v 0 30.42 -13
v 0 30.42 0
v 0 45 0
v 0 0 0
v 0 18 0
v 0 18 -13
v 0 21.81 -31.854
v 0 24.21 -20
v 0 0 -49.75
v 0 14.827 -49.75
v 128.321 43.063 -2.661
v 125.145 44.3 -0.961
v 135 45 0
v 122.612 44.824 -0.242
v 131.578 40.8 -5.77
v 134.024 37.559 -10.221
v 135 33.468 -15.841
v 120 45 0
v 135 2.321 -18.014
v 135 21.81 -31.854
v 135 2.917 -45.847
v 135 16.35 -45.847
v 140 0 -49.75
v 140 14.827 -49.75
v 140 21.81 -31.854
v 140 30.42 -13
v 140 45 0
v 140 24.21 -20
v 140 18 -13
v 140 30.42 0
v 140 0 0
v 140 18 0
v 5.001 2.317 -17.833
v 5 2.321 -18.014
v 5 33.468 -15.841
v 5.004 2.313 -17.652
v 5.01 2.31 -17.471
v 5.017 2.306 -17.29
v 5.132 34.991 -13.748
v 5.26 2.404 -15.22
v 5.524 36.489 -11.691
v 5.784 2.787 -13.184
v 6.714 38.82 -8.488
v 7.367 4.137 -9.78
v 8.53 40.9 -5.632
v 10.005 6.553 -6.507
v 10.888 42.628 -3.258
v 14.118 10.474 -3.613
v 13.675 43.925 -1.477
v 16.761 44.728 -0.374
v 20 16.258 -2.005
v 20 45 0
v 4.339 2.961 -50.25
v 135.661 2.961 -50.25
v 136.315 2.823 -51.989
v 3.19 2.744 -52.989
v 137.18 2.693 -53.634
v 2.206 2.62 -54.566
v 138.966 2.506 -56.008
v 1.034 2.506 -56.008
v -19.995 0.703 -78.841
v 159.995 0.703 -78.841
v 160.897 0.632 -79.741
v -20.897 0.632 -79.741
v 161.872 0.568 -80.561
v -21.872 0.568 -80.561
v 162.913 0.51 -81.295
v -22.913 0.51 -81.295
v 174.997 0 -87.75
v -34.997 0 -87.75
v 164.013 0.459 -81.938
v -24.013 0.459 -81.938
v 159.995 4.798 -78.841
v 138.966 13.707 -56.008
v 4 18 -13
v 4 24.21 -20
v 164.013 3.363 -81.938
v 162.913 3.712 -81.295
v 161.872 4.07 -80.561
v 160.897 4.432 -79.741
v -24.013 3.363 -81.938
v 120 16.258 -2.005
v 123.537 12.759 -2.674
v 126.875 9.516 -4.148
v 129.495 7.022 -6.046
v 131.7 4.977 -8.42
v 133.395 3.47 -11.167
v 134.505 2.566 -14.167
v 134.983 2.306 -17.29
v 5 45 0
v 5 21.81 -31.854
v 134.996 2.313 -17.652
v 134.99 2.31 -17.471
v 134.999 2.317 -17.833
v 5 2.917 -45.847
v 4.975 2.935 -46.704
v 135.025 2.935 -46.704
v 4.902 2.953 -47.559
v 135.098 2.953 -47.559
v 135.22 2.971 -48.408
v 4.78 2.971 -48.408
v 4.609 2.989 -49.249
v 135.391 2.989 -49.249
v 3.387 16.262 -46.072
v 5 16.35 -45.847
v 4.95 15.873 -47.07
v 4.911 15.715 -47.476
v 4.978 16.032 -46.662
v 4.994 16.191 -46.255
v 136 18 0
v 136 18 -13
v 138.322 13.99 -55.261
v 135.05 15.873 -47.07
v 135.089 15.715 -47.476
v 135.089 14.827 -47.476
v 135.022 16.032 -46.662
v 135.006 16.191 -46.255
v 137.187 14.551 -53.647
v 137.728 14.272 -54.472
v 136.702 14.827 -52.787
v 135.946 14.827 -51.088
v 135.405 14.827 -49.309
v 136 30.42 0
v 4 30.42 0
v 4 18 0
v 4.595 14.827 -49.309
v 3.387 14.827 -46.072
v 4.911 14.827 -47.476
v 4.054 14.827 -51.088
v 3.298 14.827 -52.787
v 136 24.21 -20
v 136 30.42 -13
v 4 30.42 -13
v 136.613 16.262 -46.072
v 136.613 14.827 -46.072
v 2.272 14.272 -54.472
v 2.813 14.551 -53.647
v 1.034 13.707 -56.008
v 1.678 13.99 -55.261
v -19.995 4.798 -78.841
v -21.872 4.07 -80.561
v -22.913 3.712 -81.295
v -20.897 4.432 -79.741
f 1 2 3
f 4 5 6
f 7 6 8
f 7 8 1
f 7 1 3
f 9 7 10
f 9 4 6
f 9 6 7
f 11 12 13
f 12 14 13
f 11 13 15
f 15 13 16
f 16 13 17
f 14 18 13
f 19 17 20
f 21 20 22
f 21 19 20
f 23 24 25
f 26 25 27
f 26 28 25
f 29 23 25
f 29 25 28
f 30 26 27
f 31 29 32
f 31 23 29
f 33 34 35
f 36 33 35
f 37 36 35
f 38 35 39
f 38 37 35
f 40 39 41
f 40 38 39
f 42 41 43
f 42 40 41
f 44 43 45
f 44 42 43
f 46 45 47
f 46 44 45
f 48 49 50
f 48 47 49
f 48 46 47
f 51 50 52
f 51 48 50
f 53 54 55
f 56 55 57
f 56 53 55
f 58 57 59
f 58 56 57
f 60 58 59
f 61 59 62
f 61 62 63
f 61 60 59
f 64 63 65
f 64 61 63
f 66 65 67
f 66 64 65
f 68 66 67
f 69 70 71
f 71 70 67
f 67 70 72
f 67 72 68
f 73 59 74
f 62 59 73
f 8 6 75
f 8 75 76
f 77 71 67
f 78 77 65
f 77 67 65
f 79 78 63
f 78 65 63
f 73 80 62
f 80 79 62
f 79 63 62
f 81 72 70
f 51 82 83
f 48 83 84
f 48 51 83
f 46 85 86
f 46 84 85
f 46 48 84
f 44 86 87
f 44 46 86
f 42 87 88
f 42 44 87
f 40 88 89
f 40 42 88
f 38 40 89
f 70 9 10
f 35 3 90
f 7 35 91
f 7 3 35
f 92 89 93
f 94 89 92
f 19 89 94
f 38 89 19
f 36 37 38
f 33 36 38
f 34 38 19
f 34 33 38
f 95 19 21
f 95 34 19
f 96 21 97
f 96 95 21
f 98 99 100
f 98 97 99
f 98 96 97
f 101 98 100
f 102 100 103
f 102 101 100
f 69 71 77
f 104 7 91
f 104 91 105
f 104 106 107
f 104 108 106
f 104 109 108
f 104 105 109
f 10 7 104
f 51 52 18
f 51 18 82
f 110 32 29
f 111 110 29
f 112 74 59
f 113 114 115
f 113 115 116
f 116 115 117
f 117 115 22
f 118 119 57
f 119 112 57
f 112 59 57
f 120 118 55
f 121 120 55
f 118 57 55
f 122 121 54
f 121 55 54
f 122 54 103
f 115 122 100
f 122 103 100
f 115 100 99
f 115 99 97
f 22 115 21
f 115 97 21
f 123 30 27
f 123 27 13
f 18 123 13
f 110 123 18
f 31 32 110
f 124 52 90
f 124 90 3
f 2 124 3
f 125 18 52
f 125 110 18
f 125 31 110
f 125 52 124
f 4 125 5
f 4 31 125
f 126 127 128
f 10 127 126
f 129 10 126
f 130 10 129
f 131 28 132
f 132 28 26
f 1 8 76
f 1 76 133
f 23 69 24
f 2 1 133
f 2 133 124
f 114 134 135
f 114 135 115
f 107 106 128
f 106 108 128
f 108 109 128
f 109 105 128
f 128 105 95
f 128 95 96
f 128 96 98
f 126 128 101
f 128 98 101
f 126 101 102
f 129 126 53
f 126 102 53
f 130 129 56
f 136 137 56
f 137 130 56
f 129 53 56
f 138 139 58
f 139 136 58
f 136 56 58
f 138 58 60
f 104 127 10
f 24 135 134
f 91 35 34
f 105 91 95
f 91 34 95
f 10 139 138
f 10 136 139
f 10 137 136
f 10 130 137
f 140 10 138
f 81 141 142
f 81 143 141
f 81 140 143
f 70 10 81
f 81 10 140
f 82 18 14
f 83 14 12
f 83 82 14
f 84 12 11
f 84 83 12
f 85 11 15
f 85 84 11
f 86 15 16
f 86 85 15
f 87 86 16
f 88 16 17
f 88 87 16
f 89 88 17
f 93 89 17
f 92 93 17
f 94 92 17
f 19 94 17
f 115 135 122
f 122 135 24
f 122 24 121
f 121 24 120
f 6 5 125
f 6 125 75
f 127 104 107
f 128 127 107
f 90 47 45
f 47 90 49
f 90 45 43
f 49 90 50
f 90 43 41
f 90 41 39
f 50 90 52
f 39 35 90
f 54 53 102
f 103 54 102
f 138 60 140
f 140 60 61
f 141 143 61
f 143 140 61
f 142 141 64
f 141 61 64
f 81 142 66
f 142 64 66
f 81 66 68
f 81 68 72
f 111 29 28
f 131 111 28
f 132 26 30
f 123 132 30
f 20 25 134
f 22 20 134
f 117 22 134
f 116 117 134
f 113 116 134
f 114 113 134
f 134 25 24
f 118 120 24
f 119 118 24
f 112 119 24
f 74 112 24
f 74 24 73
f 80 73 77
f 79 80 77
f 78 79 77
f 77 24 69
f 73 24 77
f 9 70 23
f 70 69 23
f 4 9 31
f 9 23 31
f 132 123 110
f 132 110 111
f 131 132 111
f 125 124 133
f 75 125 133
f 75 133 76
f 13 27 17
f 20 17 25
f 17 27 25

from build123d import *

# Parameters (mm, degrees)
BOSS_EXTRUDE3_DEPTH     = 45
CUT_EXTRUDE1_DEPTH      = 201.870207973
CUT_EXTRUDE1_DEPTH_BACK = 201.870207973
BOSS_EXTRUDE10_DEPTH    = 45
CUT_EXTRUDE2_DEPTH      = 201.870207973
CUT_EXTRUDE3_DEPTH      = 189.545324927
SKETCH14_W              = 5
SKETCH14_H              = 30.172848437
CUT_EXTRUDE4_DEPTH      = 5
FILLET2_R               = 15
FILLET4_R               = 10
CUT_EXTRUDE5_DEPTH      = 4


with BuildPart() as part:
    # Sketch4 → Boss-Extrude3 (new body)
    with BuildSketch(Plane(origin=(0, 0, 0), x_dir=(1, 0, 0), z_dir=(0, 1, 0))):
        Polygon((0, 49.75), (-34.996508397, 87.75), (174.996508397, 87.75), (140, 49.75), (140, 0), (0, 0), align=None)
    extrude(amount=BOSS_EXTRUDE3_DEPTH)

    # Sketch5 → Cut-Extrude1 (cut, two sides: drawn at the far end of the back side and taken through both)
    with BuildSketch(Plane(origin=(140, 0, 0), x_dir=(0, 0, -1), z_dir=(1, 0, 0)).offset(-CUT_EXTRUDE1_DEPTH_BACK)):
        Polygon((0, 45), (3, 2), (49.75, 3), (87.75, 0), (87.75, 45), align=None)
    extrude(amount=CUT_EXTRUDE1_DEPTH + CUT_EXTRUDE1_DEPTH_BACK, mode=Mode.SUBTRACT)

    # Sketch12 → Boss-Extrude10 (add)
    with BuildSketch(Plane.XZ):
        Polygon((140, 0), (135, 0), (135, -51.701623266), (161.738177617, -80.734541004), (174.996508397, -87.75), (140, -49.75), align=None)
    boss_extrude10 = extrude(amount=-BOSS_EXTRUDE10_DEPTH)

    # Sketch6 → Cut-Extrude2 (cut, symmetric)
    with BuildSketch(Plane(origin=(140, 0, 0), x_dir=(0, 0, -1), z_dir=(1, 0, 0))):
        Polygon((49.75, 45), (0, 45), (31.854288426, 21.809847033), (49.75, 14.827151563), align=None)
    cut_extrude2 = extrude(amount=CUT_EXTRUDE2_DEPTH, both=True, mode=Mode.SUBTRACT)

    # Sketch13 → Cut-Extrude3 (cut, symmetric)
    with BuildSketch(Plane(origin=(50.959743513, 0, 46.931923468), x_dir=(0.6774391869389724, 0, -0.7355787843592718), z_dir=(0.7355787843592718, 0, 0.6774391869389724))):
        Polygon((131.436530693, 14.827151563), (183.096530693, 0), (183.096530693, 45), (131.436530693, 45), align=None)
    cut_extrude3 = extrude(amount=CUT_EXTRUDE3_DEPTH, both=True, mode=Mode.SUBTRACT)

    # Sketch14 → Cut-Extrude4 (cut)
    with BuildSketch(Plane(origin=(89.040256487, 0, -96.681923468), x_dir=(-0.7355787843592717, 0, -0.6774391869389725), z_dir=(0.6774391869389725, 0, -0.7355787843592717))):
        with Locations((-66.77843026, 29.913575782)):
            Rectangle(SKETCH14_W, SKETCH14_H)
    cut_extrude4 = extrude(amount=-CUT_EXTRUDE4_DEPTH, mode=Mode.SUBTRACT)

    # Mirror1: Boss-Extrude10, Cut-Extrude2, Cut-Extrude3, Cut-Extrude4 across plane
    add(boss_extrude10.mirror(Plane(origin=(70, 0, 0), x_dir=(0, 0, 1), z_dir=(1, 0, 0))))
    add(cut_extrude2.mirror(Plane(origin=(70, 0, 0), x_dir=(0, 0, 1), z_dir=(1, 0, 0))), mode=Mode.SUBTRACT)
    add(cut_extrude3.mirror(Plane(origin=(70, 0, 0), x_dir=(0, 0, 1), z_dir=(1, 0, 0))), mode=Mode.SUBTRACT)
    add(cut_extrude4.mirror(Plane(origin=(70, 0, 0), x_dir=(0, 0, 1), z_dir=(1, 0, 0))), mode=Mode.SUBTRACT)

    # Fillet2
    # the kernel refuses this fillet: 15 mm, written as the material it adds along each edge
    with BuildSketch(Plane(origin=(5, -35.409066281, -5.609934857), x_dir=(1, 0, 0), z_dir=(0, 0.9975751008362208, 0.06959826284903867))) as fillet2_piece_1_section:
        with BuildLine():
            CenterArc((FILLET2_R, FILLET2_R), FILLET2_R, 180, 90)
            Line((0, FILLET2_R), (0, 0))
            Line((0, 0), (FILLET2_R, 0))
        make_face()
    fillet2_piece_1 = extrude(amount=118.104524125, mode=Mode.PRIVATE)
    fillet2_piece_1 = split(fillet2_piece_1, bisect_by=Plane(origin=(8.441655444, 34.86103845, -13.92700626), z_dir=(0, -0.808453521145491, 0.5885600259510132)), keep=Keep.TOP, mode=Mode.PRIVATE)
    fillet2_piece_1 = split(fillet2_piece_1, bisect_by=Plane(origin=(8.441655444, 0, -4.786685936), z_dir=(0, 1, 0)), keep=Keep.TOP, mode=Mode.PRIVATE)
    add(fillet2_piece_1)
    with BuildSketch(Plane(origin=(135, -35.409066281, -5.609934857), x_dir=(-1, 0, 0), z_dir=(0, 0.9975751008362208, 0.06959826284903867))) as fillet2_piece_2_section:
        with BuildLine():
            CenterArc((FILLET2_R, -FILLET2_R), FILLET2_R, 90, 90)
            Line((0, -FILLET2_R), (0, 0))
            Line((0, 0), (FILLET2_R, 0))
        make_face()
    fillet2_piece_2 = extrude(amount=118.104524125, mode=Mode.PRIVATE)
    fillet2_piece_2 = split(fillet2_piece_2, bisect_by=Plane(origin=(131.558344556, 34.86103845, -13.92700626), z_dir=(0, -0.808453521145491, 0.5885600259510132)), keep=Keep.TOP, mode=Mode.PRIVATE)
    fillet2_piece_2 = split(fillet2_piece_2, bisect_by=Plane(origin=(131.558344556, 0, -4.786685936), z_dir=(0, 1, 0)), keep=Keep.TOP, mode=Mode.PRIVATE)
    add(fillet2_piece_2)
    with BuildSketch(Plane(origin=(5, 2, -3), x_dir=(0, 0.9975751008362208, 0.06959826284903871), z_dir=(1, 0, 0))) as fillet2_piece_3_section:
        with BuildLine():
            CenterArc((FILLET2_R * 0.952861026227, -FILLET2_R), FILLET2_R, 90, 87.234478204)
            Line((-FILLET2_R * 0.0459743260206, -FILLET2_R * 0.951751278775), (0, 0))
            Line((0, 0), (FILLET2_R * 0.952861026227, 0))
        make_face()
    fillet2_piece_3 = extrude(amount=165.732288484, mode=Mode.PRIVATE)
    fillet2_piece_3 = split(fillet2_piece_3, bisect_by=Plane(origin=(140, 5.230522006, -5.949029167), z_dir=(-1, 0, 0)), keep=Keep.TOP, mode=Mode.PRIVATE)
    add(fillet2_piece_3)
    # the kernel refuses this fillet: 15 mm, written as the material it takes off along each edge
    with BuildSketch(Plane(origin=(-21.738177617, -5.880130796, -80.734541004), x_dir=(-0.8838887186878241, 0, -0.4676972663768696), z_dir=(0, 1, 0))) as fillet2_2_piece_1_section:
        with BuildLine():
            CenterArc((FILLET2_R * 0.171572875254, FILLET2_R), FILLET2_R, 250.528779366, 19.471220634)
            Line((-FILLET2_R * 0.16176045808, FILLET2_R * 0.0571909584179), (0, 0))
            Line((0, 0), (FILLET2_R * 0.171572875254, 0))
        make_face()
    fillet2_2_piece_1 = extrude(amount=16.37310681, mode=Mode.PRIVATE)
    fillet2_2_piece_1 = split(fillet2_2_piece_1, bisect_by=Plane(origin=(-21.810642067, 0.577757784, -80.431734736), z_dir=(0, 0.9968981486534686, -0.07870248542001068)), keep=Keep.TOP, mode=Mode.PRIVATE)
    add(fillet2_2_piece_1, mode=Mode.SUBTRACT)
    with BuildSketch(Plane(origin=(5, -11.791250012, -51.701623266), x_dir=(-0.6774391869389725, 0, -0.7355787843592716), z_dir=(0, 1, 0))) as fillet2_2_piece_2_section:
        with BuildLine():
            CenterArc((FILLET2_R * 0.390324653104, FILLET2_R), FILLET2_R, 227.356145275, 42.643854725)
            Line((-FILLET2_R * 0.287114533835, FILLET2_R * 0.264421215641), (0, 0))
            Line((0, 0), (FILLET2_R * 0.390324653104, 0))
        make_face()
    fillet2_2_piece_2 = extrude(amount=41.255576067, mode=Mode.PRIVATE)
    fillet2_2_piece_2 = split(fillet2_2_piece_2, bisect_by=Plane(origin=(4.876560205, 2.973184578, -48.496379006), z_dir=(0, 0.9997713044194101, 0.021385482447473975)), keep=Keep.TOP, mode=Mode.PRIVATE)
    add(fillet2_2_piece_2, mode=Mode.SUBTRACT)
    with BuildSketch(Plane(origin=(5, -11.791250012, -51.701623266), x_dir=(-0.6774391869389725, 0, -0.7355787843592716), z_dir=(0, 1, 0))) as fillet2_2_piece_3_section:
        with BuildLine():
            CenterArc((FILLET2_R * 0.390324653104, FILLET2_R), FILLET2_R, 227.356145275, 42.643854725)
            Line((-FILLET2_R * 0.287114533835, FILLET2_R * 0.264421215641), (0, 0))
            Line((0, 0), (FILLET2_R * 0.390324653104, 0))
        make_face()
    fillet2_2_piece_3 = extrude(amount=41.255576067, mode=Mode.PRIVATE)
    fillet2_2_piece_3 = split(fillet2_2_piece_3, bisect_by=Plane(origin=(3.697267627, 2.777037551, -52.574191023), z_dir=(0, 0.9968981486534686, -0.07870248542001068)), keep=Keep.TOP, mode=Mode.PRIVATE)
    add(fillet2_2_piece_3, mode=Mode.SUBTRACT)
    with BuildSketch(Plane(origin=(161.738177617, -5.880130796, -80.734541004), x_dir=(-0.6774391869389714, 0, 0.7355787843592727), z_dir=(0, 1, 0))) as fillet2_2_piece_4_section:
        with BuildLine():
            CenterArc((FILLET2_R * 0.171572875254, FILLET2_R), FILLET2_R, 250.528779366, 19.471220634)
            Line((-FILLET2_R * 0.16176045808, FILLET2_R * 0.0571909584179), (0, 0))
            Line((0, 0), (FILLET2_R * 0.171572875254, 0))
        make_face()
    fillet2_2_piece_4 = extrude(amount=16.37310681, mode=Mode.PRIVATE)
    fillet2_2_piece_4 = split(fillet2_2_piece_4, bisect_by=Plane(origin=(161.810642067, 0.577757784, -80.431734736), z_dir=(0, 0.9968981486534686, -0.07870248542001068)), keep=Keep.TOP, mode=Mode.PRIVATE)
    add(fillet2_2_piece_4, mode=Mode.SUBTRACT)
    with BuildSketch(Plane(origin=(135, -11.791250012, -51.701623266), x_dir=(0.6774391869389733, 0, -0.7355787843592709), z_dir=(0, 1, 0))) as fillet2_2_piece_5_section:
        with BuildLine():
            CenterArc((FILLET2_R * 0.390324653104, -FILLET2_R), FILLET2_R, 90, 42.643854725)
            Line((-FILLET2_R * 0.287114533835, -FILLET2_R * 0.264421215641), (0, 0))
            Line((0, 0), (FILLET2_R * 0.390324653104, 0))
        make_face()
    fillet2_2_piece_5 = extrude(amount=41.255576067, mode=Mode.PRIVATE)
    fillet2_2_piece_5 = split(fillet2_2_piece_5, bisect_by=Plane(origin=(135.123439795, 2.973184578, -48.496379006), z_dir=(0, 0.9997713044194101, 0.021385482447473975)), keep=Keep.TOP, mode=Mode.PRIVATE)
    add(fillet2_2_piece_5, mode=Mode.SUBTRACT)
    with BuildSketch(Plane(origin=(135, -11.791250012, -51.701623266), x_dir=(0.6774391869389733, 0, -0.7355787843592709), z_dir=(0, 1, 0))) as fillet2_2_piece_6_section:
        with BuildLine():
            CenterArc((FILLET2_R * 0.390324653104, -FILLET2_R), FILLET2_R, 90, 42.643854725)
            Line((-FILLET2_R * 0.287114533835, -FILLET2_R * 0.264421215641), (0, 0))
            Line((0, 0), (FILLET2_R * 0.390324653104, 0))
        make_face()
    fillet2_2_piece_6 = extrude(amount=41.255576067, mode=Mode.PRIVATE)
    fillet2_2_piece_6 = split(fillet2_2_piece_6, bisect_by=Plane(origin=(136.302732373, 2.777037551, -52.574191023), z_dir=(0, 0.9968981486534686, -0.07870248542001068)), keep=Keep.TOP, mode=Mode.PRIVATE)
    add(fillet2_2_piece_6, mode=Mode.SUBTRACT)

    # Fillet4
    fillet4_edges = [part.edges().sort_by_distance(p)[0] for p in [
        (70, 3, -49.75),
    ]]
    fillet(fillet4_edges, radius=FILLET4_R)

    # Sketch16 → Cut-Extrude5 (cut)
    with BuildSketch(Plane(origin=(140, 0, 0), x_dir=(0, 0, -1), z_dir=(1, 0, 0))):
        Polygon((0, 30.42), (0, 18), (13, 18), (20, 24.21), (13, 30.42), align=None)
    cut_extrude5 = extrude(amount=-CUT_EXTRUDE5_DEPTH, mode=Mode.SUBTRACT)

    # Mirror2: Cut-Extrude5 across plane
    add(cut_extrude5.mirror(Plane(origin=(70, 0, 0), x_dir=(0, 0, 1), z_dir=(1, 0, 0))), mode=Mode.SUBTRACT)


solid = part.part
